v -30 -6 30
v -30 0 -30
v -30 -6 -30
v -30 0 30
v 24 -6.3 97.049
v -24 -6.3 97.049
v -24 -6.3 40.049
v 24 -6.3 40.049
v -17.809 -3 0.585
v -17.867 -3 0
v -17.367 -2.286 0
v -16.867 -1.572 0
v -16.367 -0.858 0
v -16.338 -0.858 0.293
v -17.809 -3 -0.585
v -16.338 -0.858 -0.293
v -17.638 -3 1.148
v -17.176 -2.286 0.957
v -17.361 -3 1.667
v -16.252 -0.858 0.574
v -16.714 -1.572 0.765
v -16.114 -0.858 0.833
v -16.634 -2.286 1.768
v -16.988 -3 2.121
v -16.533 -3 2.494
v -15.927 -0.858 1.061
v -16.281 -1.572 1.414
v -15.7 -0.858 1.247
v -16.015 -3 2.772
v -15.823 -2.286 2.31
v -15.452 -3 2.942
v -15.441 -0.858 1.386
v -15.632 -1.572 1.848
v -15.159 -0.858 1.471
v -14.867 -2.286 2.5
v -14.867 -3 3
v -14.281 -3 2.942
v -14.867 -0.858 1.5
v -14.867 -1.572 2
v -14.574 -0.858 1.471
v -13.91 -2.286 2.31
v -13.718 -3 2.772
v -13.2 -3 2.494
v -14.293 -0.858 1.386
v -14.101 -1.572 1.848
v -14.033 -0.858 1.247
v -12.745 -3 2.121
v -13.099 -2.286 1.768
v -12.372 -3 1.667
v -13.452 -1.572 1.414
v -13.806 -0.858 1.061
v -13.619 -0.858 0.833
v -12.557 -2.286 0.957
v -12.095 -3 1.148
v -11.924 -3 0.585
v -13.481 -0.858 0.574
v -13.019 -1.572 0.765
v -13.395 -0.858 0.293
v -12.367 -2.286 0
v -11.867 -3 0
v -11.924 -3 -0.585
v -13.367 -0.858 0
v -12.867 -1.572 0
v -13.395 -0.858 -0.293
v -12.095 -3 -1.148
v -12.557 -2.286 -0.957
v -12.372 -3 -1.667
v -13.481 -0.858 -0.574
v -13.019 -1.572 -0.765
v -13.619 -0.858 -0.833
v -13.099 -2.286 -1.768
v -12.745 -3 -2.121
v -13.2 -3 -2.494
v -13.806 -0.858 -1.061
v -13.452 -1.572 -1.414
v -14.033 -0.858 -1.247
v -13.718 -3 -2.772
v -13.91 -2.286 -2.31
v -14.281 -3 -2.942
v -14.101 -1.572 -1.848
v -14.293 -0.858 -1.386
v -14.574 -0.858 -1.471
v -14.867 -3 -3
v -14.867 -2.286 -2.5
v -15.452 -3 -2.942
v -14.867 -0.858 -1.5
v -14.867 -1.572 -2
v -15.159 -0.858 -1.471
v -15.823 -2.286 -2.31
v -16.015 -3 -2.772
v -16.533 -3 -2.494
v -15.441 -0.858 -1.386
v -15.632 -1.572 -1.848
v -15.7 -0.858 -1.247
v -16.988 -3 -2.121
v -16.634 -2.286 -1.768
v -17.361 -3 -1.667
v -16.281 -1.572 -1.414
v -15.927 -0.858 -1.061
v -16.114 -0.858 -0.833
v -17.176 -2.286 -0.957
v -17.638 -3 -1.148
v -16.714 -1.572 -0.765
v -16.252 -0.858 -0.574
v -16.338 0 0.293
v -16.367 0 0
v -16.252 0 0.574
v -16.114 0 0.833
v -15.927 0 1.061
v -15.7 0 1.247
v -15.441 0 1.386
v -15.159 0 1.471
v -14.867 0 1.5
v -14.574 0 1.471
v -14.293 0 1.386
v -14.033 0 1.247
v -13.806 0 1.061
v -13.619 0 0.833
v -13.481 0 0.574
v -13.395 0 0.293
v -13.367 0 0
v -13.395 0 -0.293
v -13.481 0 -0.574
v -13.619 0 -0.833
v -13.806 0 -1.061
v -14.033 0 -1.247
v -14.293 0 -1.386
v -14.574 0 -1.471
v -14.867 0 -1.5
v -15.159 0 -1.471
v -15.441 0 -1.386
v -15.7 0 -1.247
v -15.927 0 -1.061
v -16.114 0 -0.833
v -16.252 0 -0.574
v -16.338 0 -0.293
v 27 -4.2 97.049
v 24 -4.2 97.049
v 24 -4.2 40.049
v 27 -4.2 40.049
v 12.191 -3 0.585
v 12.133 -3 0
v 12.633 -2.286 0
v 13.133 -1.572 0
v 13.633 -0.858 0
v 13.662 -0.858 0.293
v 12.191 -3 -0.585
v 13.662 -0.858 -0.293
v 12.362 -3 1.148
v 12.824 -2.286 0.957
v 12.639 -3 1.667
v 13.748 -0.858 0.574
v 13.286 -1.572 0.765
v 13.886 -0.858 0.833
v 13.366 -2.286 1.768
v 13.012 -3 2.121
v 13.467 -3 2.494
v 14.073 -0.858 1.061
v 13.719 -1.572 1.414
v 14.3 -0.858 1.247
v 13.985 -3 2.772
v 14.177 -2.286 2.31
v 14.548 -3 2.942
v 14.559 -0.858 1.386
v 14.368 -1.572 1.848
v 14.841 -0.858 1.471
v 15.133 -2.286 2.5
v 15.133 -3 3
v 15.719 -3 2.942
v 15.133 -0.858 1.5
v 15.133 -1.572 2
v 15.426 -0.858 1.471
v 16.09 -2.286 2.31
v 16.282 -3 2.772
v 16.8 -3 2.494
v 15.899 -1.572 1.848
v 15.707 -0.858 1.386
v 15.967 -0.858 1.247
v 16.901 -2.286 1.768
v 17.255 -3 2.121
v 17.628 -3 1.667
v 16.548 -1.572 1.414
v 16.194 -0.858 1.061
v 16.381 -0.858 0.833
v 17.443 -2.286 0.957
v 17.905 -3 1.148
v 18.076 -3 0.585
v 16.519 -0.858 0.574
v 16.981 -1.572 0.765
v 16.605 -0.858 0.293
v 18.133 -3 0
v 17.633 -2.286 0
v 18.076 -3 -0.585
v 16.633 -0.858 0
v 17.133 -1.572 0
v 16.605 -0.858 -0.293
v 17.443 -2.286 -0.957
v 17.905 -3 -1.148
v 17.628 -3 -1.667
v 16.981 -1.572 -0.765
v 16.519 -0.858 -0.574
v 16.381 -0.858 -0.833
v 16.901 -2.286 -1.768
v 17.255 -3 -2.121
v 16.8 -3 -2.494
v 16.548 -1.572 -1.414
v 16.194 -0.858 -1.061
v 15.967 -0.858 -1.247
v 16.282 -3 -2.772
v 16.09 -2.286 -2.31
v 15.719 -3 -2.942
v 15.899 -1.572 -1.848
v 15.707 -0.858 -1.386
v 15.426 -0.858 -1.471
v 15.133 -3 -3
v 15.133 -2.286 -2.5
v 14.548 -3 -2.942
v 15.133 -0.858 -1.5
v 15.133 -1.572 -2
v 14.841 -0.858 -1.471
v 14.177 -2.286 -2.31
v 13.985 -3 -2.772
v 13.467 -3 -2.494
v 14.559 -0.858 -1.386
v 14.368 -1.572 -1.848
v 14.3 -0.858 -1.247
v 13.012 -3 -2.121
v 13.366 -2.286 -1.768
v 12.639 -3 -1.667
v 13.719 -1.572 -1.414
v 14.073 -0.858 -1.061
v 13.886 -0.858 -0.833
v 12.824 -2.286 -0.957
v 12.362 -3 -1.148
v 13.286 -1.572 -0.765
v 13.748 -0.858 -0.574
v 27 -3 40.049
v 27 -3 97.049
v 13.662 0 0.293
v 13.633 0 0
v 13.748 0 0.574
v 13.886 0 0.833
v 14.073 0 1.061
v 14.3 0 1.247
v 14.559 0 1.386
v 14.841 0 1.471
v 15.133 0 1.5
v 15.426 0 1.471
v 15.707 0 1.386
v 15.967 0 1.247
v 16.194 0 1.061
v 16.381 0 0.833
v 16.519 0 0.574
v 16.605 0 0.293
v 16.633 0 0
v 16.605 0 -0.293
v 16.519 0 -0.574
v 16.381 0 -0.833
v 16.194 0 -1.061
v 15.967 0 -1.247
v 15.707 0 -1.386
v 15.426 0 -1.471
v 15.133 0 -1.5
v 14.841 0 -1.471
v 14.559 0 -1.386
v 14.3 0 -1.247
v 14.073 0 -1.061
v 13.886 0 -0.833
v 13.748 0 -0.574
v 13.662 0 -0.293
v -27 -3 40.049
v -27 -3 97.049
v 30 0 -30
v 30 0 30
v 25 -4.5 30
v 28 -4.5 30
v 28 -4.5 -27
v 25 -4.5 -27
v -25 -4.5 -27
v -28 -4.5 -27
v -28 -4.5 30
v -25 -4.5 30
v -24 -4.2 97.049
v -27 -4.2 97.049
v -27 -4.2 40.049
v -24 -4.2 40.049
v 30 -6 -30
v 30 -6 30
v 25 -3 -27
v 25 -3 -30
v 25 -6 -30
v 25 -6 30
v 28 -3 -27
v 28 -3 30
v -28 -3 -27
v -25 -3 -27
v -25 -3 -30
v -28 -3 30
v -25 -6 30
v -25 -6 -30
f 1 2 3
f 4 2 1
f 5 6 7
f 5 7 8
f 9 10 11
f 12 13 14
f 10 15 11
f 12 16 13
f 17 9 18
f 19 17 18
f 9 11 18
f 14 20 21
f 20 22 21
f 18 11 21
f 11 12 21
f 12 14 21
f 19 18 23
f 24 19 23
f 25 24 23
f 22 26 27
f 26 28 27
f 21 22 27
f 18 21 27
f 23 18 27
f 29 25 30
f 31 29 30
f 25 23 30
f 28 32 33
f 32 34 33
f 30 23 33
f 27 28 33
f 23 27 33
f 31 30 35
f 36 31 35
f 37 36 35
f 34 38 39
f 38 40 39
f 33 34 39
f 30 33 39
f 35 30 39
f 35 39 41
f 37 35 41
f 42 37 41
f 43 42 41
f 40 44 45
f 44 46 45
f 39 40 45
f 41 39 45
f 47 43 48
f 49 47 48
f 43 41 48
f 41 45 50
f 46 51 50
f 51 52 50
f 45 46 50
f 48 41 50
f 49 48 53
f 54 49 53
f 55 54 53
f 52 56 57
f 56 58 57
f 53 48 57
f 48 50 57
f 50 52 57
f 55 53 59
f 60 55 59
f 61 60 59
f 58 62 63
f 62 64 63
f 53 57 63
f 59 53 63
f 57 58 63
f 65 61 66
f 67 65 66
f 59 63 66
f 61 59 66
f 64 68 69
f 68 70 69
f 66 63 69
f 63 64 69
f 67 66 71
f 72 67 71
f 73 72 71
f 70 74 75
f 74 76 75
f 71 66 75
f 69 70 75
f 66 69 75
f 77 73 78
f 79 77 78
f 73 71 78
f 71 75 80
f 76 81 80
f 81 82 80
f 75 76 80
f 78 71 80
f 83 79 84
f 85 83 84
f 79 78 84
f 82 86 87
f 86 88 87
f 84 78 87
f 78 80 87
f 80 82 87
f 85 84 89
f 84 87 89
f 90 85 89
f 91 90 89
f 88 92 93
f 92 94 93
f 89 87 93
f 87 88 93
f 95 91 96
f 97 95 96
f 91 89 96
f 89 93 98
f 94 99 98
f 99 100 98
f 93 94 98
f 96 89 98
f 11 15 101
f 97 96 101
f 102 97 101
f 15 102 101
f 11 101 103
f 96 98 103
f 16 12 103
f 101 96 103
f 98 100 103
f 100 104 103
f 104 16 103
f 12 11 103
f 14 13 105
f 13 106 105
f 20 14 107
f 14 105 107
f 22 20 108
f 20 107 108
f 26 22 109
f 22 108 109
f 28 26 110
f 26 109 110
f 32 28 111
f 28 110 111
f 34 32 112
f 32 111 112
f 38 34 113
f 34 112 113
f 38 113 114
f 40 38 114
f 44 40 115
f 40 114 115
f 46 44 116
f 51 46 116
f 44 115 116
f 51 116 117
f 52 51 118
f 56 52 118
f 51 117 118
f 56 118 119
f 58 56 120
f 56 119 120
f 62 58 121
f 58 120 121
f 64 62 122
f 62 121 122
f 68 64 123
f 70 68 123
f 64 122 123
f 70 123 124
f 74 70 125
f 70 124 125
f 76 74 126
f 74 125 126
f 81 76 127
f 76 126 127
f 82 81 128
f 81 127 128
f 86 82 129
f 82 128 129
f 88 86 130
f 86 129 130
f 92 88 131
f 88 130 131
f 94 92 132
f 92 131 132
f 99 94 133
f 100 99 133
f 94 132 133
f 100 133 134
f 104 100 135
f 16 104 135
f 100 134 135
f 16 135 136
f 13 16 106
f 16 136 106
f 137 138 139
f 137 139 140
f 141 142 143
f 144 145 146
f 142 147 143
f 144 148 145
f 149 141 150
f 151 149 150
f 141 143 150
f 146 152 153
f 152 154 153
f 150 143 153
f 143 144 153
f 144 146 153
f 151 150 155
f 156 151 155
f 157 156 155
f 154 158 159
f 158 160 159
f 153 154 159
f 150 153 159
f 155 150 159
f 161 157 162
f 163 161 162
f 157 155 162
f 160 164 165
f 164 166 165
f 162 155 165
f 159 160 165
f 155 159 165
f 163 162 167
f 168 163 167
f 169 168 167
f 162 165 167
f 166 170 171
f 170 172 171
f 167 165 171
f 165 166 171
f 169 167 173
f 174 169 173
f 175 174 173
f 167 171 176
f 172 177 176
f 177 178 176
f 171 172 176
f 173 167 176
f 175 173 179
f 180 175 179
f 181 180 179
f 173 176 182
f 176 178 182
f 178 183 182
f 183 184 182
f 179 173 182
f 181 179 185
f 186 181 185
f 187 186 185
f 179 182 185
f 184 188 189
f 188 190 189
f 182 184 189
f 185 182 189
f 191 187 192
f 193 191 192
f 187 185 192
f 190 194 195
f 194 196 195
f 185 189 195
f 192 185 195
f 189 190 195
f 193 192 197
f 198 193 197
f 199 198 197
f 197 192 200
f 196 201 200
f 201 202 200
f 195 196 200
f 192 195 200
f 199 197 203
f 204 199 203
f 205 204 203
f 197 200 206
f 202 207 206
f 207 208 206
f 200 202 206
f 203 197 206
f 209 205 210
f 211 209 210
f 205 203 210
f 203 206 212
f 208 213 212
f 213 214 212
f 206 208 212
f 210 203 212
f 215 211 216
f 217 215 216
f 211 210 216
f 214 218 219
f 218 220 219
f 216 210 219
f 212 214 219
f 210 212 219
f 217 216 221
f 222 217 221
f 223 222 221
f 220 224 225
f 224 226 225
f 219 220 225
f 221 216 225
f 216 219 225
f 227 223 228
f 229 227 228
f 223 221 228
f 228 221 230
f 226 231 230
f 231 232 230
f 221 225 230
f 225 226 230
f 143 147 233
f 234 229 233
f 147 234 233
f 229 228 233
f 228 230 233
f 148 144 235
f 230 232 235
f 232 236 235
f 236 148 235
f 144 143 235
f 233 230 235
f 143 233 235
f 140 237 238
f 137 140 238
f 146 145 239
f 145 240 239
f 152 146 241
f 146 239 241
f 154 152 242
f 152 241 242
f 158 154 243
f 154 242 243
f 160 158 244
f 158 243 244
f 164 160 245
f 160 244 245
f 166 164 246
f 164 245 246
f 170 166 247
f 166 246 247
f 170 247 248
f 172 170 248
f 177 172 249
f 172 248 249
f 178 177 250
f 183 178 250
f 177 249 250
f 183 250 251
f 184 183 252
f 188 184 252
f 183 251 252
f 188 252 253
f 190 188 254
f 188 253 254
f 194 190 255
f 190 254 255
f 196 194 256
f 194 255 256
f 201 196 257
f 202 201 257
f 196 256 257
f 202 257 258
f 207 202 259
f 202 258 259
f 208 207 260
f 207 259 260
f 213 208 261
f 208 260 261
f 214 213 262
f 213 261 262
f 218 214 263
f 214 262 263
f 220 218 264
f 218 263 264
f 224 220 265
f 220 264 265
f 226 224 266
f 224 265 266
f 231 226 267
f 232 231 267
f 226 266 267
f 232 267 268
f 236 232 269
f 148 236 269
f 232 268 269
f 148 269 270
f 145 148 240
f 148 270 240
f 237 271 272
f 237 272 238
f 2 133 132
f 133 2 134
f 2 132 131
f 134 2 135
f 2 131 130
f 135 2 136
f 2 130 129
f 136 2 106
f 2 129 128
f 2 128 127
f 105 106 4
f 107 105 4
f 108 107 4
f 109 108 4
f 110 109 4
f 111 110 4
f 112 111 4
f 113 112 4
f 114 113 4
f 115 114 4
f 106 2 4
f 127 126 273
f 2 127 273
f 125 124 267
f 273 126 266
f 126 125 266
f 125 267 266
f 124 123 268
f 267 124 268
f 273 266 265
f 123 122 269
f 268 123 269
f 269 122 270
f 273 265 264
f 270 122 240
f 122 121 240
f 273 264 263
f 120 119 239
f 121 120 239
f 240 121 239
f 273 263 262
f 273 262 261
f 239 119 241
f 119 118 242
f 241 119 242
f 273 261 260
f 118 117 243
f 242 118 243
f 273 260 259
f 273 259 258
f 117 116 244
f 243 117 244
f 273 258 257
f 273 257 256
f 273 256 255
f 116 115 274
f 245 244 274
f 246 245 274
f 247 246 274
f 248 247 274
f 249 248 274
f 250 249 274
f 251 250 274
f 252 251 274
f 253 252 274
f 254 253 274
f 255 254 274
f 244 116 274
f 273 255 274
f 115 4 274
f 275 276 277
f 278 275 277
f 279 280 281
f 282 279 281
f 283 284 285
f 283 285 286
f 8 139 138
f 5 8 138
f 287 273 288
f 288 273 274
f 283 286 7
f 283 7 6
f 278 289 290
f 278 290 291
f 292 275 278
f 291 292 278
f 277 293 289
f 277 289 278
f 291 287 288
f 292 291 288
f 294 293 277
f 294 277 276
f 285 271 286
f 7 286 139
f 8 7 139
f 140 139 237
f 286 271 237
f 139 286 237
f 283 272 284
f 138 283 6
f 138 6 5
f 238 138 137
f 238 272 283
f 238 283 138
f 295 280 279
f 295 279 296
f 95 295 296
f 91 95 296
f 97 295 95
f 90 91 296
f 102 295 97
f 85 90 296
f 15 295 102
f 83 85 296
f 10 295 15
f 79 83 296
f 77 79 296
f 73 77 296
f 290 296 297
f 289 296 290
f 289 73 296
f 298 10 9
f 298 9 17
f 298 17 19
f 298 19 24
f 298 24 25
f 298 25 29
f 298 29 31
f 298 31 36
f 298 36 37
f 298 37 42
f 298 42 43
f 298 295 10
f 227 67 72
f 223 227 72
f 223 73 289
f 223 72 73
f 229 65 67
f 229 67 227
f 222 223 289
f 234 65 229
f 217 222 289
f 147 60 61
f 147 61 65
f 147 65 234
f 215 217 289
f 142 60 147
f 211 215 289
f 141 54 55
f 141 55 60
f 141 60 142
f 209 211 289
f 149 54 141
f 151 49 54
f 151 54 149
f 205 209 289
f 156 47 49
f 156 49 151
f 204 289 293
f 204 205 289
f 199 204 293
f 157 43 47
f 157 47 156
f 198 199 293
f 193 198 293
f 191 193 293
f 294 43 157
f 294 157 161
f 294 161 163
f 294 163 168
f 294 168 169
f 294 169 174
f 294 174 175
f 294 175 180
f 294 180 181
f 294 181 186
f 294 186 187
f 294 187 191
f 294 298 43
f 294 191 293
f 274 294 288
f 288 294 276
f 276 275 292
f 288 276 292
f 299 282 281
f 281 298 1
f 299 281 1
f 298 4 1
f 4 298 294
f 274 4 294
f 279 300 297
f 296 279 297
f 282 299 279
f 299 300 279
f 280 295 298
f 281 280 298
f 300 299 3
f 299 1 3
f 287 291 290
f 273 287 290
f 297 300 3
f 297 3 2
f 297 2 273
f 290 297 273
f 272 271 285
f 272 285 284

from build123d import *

# Parameters (mm, degrees)
F0_W           = 60
F0_H           = 60
F1_DEPTH       = 3
F2_W           = 2
F2_H           = 60
F3_DEPTH       = 3
F5_D           = 3
F5_CSINK_D     = 6
F5_CSINK_ANGLE = 70
F6_W           = 1.5
F6_H           = 3
F7_DEPTH       = 3
F8_W           = 1.5
F8_H           = 3
F9_DEPTH       = 3
F10_W          = 54
F10_H          = 57
F11_DEPTH      = 1.2
F12_W          = 48
F12_H          = 57
F13_DEPTH      = 2.1


# Not quite as in the source:
# - a feature names something its author has since deleted; it is built from what else it names


with BuildPart() as f1:
    # F0 (on Front) → F1 (new body)
    with BuildSketch(Plane.XZ):
        Rectangle(F0_W, F0_H)
    extrude(amount=F1_DEPTH)

    # F2 (on face) → F3 (join)
    with BuildSketch(Plane.XZ.offset(3)):
        with Locations((29, 0)):
            Rectangle(F2_W, F2_H)
        with Locations((-29, 0)):
            Rectangle(F2_W, F2_H)
    extrude(amount=F3_DEPTH)

    # F5 (through all)
    with Locations(Plane.XZ.offset(3)):
        with Locations((15.1334543969, 0), (-14.8665456031, 0)):
            CounterSinkHole(F5_D / 2, F5_CSINK_D / 2, counter_sink_angle=F5_CSINK_ANGLE)

    # F6 (on face) → F7 (join)
    with BuildSketch(Plane(origin=(28, 0, 0), x_dir=(0, -1, 0), z_dir=(-1, 0, 0))):
        Polygon((6, -30), (6, 30), (4.5, 30), (4.5, -27), (4.5, -30), align=None)
        with Locations((3.75, -28.5)):
            Rectangle(F6_W, F6_H)
    extrude(amount=F7_DEPTH)

    # F8 (on face) → F9 (join)
    with BuildSketch(Plane.YZ.offset(-28)):
        Polygon((-4.5, 30), (-6, 30), (-6, -30), (-4.5, -30), (-4.5, -27), align=None)
        with Locations((-3.75, -28.5)):
            Rectangle(F8_W, F8_H)
    extrude(amount=F9_DEPTH)


with BuildPart() as f11:
    # F10 (on face) → F11 (new body)
    with BuildSketch(Plane.XZ.offset(3)):
        with Locations((0, 68.5490723848)):
            Rectangle(F10_W, F10_H)
    extrude(amount=F11_DEPTH)

    # F12 (on face) → F13 (join)
    with BuildSketch(Plane.XZ.offset(4.2)):
        with Locations((0, 68.5490723848)):
            Rectangle(F12_W, F12_H)
    extrude(amount=F13_DEPTH)


solid = Compound([f1.part, f11.part])
